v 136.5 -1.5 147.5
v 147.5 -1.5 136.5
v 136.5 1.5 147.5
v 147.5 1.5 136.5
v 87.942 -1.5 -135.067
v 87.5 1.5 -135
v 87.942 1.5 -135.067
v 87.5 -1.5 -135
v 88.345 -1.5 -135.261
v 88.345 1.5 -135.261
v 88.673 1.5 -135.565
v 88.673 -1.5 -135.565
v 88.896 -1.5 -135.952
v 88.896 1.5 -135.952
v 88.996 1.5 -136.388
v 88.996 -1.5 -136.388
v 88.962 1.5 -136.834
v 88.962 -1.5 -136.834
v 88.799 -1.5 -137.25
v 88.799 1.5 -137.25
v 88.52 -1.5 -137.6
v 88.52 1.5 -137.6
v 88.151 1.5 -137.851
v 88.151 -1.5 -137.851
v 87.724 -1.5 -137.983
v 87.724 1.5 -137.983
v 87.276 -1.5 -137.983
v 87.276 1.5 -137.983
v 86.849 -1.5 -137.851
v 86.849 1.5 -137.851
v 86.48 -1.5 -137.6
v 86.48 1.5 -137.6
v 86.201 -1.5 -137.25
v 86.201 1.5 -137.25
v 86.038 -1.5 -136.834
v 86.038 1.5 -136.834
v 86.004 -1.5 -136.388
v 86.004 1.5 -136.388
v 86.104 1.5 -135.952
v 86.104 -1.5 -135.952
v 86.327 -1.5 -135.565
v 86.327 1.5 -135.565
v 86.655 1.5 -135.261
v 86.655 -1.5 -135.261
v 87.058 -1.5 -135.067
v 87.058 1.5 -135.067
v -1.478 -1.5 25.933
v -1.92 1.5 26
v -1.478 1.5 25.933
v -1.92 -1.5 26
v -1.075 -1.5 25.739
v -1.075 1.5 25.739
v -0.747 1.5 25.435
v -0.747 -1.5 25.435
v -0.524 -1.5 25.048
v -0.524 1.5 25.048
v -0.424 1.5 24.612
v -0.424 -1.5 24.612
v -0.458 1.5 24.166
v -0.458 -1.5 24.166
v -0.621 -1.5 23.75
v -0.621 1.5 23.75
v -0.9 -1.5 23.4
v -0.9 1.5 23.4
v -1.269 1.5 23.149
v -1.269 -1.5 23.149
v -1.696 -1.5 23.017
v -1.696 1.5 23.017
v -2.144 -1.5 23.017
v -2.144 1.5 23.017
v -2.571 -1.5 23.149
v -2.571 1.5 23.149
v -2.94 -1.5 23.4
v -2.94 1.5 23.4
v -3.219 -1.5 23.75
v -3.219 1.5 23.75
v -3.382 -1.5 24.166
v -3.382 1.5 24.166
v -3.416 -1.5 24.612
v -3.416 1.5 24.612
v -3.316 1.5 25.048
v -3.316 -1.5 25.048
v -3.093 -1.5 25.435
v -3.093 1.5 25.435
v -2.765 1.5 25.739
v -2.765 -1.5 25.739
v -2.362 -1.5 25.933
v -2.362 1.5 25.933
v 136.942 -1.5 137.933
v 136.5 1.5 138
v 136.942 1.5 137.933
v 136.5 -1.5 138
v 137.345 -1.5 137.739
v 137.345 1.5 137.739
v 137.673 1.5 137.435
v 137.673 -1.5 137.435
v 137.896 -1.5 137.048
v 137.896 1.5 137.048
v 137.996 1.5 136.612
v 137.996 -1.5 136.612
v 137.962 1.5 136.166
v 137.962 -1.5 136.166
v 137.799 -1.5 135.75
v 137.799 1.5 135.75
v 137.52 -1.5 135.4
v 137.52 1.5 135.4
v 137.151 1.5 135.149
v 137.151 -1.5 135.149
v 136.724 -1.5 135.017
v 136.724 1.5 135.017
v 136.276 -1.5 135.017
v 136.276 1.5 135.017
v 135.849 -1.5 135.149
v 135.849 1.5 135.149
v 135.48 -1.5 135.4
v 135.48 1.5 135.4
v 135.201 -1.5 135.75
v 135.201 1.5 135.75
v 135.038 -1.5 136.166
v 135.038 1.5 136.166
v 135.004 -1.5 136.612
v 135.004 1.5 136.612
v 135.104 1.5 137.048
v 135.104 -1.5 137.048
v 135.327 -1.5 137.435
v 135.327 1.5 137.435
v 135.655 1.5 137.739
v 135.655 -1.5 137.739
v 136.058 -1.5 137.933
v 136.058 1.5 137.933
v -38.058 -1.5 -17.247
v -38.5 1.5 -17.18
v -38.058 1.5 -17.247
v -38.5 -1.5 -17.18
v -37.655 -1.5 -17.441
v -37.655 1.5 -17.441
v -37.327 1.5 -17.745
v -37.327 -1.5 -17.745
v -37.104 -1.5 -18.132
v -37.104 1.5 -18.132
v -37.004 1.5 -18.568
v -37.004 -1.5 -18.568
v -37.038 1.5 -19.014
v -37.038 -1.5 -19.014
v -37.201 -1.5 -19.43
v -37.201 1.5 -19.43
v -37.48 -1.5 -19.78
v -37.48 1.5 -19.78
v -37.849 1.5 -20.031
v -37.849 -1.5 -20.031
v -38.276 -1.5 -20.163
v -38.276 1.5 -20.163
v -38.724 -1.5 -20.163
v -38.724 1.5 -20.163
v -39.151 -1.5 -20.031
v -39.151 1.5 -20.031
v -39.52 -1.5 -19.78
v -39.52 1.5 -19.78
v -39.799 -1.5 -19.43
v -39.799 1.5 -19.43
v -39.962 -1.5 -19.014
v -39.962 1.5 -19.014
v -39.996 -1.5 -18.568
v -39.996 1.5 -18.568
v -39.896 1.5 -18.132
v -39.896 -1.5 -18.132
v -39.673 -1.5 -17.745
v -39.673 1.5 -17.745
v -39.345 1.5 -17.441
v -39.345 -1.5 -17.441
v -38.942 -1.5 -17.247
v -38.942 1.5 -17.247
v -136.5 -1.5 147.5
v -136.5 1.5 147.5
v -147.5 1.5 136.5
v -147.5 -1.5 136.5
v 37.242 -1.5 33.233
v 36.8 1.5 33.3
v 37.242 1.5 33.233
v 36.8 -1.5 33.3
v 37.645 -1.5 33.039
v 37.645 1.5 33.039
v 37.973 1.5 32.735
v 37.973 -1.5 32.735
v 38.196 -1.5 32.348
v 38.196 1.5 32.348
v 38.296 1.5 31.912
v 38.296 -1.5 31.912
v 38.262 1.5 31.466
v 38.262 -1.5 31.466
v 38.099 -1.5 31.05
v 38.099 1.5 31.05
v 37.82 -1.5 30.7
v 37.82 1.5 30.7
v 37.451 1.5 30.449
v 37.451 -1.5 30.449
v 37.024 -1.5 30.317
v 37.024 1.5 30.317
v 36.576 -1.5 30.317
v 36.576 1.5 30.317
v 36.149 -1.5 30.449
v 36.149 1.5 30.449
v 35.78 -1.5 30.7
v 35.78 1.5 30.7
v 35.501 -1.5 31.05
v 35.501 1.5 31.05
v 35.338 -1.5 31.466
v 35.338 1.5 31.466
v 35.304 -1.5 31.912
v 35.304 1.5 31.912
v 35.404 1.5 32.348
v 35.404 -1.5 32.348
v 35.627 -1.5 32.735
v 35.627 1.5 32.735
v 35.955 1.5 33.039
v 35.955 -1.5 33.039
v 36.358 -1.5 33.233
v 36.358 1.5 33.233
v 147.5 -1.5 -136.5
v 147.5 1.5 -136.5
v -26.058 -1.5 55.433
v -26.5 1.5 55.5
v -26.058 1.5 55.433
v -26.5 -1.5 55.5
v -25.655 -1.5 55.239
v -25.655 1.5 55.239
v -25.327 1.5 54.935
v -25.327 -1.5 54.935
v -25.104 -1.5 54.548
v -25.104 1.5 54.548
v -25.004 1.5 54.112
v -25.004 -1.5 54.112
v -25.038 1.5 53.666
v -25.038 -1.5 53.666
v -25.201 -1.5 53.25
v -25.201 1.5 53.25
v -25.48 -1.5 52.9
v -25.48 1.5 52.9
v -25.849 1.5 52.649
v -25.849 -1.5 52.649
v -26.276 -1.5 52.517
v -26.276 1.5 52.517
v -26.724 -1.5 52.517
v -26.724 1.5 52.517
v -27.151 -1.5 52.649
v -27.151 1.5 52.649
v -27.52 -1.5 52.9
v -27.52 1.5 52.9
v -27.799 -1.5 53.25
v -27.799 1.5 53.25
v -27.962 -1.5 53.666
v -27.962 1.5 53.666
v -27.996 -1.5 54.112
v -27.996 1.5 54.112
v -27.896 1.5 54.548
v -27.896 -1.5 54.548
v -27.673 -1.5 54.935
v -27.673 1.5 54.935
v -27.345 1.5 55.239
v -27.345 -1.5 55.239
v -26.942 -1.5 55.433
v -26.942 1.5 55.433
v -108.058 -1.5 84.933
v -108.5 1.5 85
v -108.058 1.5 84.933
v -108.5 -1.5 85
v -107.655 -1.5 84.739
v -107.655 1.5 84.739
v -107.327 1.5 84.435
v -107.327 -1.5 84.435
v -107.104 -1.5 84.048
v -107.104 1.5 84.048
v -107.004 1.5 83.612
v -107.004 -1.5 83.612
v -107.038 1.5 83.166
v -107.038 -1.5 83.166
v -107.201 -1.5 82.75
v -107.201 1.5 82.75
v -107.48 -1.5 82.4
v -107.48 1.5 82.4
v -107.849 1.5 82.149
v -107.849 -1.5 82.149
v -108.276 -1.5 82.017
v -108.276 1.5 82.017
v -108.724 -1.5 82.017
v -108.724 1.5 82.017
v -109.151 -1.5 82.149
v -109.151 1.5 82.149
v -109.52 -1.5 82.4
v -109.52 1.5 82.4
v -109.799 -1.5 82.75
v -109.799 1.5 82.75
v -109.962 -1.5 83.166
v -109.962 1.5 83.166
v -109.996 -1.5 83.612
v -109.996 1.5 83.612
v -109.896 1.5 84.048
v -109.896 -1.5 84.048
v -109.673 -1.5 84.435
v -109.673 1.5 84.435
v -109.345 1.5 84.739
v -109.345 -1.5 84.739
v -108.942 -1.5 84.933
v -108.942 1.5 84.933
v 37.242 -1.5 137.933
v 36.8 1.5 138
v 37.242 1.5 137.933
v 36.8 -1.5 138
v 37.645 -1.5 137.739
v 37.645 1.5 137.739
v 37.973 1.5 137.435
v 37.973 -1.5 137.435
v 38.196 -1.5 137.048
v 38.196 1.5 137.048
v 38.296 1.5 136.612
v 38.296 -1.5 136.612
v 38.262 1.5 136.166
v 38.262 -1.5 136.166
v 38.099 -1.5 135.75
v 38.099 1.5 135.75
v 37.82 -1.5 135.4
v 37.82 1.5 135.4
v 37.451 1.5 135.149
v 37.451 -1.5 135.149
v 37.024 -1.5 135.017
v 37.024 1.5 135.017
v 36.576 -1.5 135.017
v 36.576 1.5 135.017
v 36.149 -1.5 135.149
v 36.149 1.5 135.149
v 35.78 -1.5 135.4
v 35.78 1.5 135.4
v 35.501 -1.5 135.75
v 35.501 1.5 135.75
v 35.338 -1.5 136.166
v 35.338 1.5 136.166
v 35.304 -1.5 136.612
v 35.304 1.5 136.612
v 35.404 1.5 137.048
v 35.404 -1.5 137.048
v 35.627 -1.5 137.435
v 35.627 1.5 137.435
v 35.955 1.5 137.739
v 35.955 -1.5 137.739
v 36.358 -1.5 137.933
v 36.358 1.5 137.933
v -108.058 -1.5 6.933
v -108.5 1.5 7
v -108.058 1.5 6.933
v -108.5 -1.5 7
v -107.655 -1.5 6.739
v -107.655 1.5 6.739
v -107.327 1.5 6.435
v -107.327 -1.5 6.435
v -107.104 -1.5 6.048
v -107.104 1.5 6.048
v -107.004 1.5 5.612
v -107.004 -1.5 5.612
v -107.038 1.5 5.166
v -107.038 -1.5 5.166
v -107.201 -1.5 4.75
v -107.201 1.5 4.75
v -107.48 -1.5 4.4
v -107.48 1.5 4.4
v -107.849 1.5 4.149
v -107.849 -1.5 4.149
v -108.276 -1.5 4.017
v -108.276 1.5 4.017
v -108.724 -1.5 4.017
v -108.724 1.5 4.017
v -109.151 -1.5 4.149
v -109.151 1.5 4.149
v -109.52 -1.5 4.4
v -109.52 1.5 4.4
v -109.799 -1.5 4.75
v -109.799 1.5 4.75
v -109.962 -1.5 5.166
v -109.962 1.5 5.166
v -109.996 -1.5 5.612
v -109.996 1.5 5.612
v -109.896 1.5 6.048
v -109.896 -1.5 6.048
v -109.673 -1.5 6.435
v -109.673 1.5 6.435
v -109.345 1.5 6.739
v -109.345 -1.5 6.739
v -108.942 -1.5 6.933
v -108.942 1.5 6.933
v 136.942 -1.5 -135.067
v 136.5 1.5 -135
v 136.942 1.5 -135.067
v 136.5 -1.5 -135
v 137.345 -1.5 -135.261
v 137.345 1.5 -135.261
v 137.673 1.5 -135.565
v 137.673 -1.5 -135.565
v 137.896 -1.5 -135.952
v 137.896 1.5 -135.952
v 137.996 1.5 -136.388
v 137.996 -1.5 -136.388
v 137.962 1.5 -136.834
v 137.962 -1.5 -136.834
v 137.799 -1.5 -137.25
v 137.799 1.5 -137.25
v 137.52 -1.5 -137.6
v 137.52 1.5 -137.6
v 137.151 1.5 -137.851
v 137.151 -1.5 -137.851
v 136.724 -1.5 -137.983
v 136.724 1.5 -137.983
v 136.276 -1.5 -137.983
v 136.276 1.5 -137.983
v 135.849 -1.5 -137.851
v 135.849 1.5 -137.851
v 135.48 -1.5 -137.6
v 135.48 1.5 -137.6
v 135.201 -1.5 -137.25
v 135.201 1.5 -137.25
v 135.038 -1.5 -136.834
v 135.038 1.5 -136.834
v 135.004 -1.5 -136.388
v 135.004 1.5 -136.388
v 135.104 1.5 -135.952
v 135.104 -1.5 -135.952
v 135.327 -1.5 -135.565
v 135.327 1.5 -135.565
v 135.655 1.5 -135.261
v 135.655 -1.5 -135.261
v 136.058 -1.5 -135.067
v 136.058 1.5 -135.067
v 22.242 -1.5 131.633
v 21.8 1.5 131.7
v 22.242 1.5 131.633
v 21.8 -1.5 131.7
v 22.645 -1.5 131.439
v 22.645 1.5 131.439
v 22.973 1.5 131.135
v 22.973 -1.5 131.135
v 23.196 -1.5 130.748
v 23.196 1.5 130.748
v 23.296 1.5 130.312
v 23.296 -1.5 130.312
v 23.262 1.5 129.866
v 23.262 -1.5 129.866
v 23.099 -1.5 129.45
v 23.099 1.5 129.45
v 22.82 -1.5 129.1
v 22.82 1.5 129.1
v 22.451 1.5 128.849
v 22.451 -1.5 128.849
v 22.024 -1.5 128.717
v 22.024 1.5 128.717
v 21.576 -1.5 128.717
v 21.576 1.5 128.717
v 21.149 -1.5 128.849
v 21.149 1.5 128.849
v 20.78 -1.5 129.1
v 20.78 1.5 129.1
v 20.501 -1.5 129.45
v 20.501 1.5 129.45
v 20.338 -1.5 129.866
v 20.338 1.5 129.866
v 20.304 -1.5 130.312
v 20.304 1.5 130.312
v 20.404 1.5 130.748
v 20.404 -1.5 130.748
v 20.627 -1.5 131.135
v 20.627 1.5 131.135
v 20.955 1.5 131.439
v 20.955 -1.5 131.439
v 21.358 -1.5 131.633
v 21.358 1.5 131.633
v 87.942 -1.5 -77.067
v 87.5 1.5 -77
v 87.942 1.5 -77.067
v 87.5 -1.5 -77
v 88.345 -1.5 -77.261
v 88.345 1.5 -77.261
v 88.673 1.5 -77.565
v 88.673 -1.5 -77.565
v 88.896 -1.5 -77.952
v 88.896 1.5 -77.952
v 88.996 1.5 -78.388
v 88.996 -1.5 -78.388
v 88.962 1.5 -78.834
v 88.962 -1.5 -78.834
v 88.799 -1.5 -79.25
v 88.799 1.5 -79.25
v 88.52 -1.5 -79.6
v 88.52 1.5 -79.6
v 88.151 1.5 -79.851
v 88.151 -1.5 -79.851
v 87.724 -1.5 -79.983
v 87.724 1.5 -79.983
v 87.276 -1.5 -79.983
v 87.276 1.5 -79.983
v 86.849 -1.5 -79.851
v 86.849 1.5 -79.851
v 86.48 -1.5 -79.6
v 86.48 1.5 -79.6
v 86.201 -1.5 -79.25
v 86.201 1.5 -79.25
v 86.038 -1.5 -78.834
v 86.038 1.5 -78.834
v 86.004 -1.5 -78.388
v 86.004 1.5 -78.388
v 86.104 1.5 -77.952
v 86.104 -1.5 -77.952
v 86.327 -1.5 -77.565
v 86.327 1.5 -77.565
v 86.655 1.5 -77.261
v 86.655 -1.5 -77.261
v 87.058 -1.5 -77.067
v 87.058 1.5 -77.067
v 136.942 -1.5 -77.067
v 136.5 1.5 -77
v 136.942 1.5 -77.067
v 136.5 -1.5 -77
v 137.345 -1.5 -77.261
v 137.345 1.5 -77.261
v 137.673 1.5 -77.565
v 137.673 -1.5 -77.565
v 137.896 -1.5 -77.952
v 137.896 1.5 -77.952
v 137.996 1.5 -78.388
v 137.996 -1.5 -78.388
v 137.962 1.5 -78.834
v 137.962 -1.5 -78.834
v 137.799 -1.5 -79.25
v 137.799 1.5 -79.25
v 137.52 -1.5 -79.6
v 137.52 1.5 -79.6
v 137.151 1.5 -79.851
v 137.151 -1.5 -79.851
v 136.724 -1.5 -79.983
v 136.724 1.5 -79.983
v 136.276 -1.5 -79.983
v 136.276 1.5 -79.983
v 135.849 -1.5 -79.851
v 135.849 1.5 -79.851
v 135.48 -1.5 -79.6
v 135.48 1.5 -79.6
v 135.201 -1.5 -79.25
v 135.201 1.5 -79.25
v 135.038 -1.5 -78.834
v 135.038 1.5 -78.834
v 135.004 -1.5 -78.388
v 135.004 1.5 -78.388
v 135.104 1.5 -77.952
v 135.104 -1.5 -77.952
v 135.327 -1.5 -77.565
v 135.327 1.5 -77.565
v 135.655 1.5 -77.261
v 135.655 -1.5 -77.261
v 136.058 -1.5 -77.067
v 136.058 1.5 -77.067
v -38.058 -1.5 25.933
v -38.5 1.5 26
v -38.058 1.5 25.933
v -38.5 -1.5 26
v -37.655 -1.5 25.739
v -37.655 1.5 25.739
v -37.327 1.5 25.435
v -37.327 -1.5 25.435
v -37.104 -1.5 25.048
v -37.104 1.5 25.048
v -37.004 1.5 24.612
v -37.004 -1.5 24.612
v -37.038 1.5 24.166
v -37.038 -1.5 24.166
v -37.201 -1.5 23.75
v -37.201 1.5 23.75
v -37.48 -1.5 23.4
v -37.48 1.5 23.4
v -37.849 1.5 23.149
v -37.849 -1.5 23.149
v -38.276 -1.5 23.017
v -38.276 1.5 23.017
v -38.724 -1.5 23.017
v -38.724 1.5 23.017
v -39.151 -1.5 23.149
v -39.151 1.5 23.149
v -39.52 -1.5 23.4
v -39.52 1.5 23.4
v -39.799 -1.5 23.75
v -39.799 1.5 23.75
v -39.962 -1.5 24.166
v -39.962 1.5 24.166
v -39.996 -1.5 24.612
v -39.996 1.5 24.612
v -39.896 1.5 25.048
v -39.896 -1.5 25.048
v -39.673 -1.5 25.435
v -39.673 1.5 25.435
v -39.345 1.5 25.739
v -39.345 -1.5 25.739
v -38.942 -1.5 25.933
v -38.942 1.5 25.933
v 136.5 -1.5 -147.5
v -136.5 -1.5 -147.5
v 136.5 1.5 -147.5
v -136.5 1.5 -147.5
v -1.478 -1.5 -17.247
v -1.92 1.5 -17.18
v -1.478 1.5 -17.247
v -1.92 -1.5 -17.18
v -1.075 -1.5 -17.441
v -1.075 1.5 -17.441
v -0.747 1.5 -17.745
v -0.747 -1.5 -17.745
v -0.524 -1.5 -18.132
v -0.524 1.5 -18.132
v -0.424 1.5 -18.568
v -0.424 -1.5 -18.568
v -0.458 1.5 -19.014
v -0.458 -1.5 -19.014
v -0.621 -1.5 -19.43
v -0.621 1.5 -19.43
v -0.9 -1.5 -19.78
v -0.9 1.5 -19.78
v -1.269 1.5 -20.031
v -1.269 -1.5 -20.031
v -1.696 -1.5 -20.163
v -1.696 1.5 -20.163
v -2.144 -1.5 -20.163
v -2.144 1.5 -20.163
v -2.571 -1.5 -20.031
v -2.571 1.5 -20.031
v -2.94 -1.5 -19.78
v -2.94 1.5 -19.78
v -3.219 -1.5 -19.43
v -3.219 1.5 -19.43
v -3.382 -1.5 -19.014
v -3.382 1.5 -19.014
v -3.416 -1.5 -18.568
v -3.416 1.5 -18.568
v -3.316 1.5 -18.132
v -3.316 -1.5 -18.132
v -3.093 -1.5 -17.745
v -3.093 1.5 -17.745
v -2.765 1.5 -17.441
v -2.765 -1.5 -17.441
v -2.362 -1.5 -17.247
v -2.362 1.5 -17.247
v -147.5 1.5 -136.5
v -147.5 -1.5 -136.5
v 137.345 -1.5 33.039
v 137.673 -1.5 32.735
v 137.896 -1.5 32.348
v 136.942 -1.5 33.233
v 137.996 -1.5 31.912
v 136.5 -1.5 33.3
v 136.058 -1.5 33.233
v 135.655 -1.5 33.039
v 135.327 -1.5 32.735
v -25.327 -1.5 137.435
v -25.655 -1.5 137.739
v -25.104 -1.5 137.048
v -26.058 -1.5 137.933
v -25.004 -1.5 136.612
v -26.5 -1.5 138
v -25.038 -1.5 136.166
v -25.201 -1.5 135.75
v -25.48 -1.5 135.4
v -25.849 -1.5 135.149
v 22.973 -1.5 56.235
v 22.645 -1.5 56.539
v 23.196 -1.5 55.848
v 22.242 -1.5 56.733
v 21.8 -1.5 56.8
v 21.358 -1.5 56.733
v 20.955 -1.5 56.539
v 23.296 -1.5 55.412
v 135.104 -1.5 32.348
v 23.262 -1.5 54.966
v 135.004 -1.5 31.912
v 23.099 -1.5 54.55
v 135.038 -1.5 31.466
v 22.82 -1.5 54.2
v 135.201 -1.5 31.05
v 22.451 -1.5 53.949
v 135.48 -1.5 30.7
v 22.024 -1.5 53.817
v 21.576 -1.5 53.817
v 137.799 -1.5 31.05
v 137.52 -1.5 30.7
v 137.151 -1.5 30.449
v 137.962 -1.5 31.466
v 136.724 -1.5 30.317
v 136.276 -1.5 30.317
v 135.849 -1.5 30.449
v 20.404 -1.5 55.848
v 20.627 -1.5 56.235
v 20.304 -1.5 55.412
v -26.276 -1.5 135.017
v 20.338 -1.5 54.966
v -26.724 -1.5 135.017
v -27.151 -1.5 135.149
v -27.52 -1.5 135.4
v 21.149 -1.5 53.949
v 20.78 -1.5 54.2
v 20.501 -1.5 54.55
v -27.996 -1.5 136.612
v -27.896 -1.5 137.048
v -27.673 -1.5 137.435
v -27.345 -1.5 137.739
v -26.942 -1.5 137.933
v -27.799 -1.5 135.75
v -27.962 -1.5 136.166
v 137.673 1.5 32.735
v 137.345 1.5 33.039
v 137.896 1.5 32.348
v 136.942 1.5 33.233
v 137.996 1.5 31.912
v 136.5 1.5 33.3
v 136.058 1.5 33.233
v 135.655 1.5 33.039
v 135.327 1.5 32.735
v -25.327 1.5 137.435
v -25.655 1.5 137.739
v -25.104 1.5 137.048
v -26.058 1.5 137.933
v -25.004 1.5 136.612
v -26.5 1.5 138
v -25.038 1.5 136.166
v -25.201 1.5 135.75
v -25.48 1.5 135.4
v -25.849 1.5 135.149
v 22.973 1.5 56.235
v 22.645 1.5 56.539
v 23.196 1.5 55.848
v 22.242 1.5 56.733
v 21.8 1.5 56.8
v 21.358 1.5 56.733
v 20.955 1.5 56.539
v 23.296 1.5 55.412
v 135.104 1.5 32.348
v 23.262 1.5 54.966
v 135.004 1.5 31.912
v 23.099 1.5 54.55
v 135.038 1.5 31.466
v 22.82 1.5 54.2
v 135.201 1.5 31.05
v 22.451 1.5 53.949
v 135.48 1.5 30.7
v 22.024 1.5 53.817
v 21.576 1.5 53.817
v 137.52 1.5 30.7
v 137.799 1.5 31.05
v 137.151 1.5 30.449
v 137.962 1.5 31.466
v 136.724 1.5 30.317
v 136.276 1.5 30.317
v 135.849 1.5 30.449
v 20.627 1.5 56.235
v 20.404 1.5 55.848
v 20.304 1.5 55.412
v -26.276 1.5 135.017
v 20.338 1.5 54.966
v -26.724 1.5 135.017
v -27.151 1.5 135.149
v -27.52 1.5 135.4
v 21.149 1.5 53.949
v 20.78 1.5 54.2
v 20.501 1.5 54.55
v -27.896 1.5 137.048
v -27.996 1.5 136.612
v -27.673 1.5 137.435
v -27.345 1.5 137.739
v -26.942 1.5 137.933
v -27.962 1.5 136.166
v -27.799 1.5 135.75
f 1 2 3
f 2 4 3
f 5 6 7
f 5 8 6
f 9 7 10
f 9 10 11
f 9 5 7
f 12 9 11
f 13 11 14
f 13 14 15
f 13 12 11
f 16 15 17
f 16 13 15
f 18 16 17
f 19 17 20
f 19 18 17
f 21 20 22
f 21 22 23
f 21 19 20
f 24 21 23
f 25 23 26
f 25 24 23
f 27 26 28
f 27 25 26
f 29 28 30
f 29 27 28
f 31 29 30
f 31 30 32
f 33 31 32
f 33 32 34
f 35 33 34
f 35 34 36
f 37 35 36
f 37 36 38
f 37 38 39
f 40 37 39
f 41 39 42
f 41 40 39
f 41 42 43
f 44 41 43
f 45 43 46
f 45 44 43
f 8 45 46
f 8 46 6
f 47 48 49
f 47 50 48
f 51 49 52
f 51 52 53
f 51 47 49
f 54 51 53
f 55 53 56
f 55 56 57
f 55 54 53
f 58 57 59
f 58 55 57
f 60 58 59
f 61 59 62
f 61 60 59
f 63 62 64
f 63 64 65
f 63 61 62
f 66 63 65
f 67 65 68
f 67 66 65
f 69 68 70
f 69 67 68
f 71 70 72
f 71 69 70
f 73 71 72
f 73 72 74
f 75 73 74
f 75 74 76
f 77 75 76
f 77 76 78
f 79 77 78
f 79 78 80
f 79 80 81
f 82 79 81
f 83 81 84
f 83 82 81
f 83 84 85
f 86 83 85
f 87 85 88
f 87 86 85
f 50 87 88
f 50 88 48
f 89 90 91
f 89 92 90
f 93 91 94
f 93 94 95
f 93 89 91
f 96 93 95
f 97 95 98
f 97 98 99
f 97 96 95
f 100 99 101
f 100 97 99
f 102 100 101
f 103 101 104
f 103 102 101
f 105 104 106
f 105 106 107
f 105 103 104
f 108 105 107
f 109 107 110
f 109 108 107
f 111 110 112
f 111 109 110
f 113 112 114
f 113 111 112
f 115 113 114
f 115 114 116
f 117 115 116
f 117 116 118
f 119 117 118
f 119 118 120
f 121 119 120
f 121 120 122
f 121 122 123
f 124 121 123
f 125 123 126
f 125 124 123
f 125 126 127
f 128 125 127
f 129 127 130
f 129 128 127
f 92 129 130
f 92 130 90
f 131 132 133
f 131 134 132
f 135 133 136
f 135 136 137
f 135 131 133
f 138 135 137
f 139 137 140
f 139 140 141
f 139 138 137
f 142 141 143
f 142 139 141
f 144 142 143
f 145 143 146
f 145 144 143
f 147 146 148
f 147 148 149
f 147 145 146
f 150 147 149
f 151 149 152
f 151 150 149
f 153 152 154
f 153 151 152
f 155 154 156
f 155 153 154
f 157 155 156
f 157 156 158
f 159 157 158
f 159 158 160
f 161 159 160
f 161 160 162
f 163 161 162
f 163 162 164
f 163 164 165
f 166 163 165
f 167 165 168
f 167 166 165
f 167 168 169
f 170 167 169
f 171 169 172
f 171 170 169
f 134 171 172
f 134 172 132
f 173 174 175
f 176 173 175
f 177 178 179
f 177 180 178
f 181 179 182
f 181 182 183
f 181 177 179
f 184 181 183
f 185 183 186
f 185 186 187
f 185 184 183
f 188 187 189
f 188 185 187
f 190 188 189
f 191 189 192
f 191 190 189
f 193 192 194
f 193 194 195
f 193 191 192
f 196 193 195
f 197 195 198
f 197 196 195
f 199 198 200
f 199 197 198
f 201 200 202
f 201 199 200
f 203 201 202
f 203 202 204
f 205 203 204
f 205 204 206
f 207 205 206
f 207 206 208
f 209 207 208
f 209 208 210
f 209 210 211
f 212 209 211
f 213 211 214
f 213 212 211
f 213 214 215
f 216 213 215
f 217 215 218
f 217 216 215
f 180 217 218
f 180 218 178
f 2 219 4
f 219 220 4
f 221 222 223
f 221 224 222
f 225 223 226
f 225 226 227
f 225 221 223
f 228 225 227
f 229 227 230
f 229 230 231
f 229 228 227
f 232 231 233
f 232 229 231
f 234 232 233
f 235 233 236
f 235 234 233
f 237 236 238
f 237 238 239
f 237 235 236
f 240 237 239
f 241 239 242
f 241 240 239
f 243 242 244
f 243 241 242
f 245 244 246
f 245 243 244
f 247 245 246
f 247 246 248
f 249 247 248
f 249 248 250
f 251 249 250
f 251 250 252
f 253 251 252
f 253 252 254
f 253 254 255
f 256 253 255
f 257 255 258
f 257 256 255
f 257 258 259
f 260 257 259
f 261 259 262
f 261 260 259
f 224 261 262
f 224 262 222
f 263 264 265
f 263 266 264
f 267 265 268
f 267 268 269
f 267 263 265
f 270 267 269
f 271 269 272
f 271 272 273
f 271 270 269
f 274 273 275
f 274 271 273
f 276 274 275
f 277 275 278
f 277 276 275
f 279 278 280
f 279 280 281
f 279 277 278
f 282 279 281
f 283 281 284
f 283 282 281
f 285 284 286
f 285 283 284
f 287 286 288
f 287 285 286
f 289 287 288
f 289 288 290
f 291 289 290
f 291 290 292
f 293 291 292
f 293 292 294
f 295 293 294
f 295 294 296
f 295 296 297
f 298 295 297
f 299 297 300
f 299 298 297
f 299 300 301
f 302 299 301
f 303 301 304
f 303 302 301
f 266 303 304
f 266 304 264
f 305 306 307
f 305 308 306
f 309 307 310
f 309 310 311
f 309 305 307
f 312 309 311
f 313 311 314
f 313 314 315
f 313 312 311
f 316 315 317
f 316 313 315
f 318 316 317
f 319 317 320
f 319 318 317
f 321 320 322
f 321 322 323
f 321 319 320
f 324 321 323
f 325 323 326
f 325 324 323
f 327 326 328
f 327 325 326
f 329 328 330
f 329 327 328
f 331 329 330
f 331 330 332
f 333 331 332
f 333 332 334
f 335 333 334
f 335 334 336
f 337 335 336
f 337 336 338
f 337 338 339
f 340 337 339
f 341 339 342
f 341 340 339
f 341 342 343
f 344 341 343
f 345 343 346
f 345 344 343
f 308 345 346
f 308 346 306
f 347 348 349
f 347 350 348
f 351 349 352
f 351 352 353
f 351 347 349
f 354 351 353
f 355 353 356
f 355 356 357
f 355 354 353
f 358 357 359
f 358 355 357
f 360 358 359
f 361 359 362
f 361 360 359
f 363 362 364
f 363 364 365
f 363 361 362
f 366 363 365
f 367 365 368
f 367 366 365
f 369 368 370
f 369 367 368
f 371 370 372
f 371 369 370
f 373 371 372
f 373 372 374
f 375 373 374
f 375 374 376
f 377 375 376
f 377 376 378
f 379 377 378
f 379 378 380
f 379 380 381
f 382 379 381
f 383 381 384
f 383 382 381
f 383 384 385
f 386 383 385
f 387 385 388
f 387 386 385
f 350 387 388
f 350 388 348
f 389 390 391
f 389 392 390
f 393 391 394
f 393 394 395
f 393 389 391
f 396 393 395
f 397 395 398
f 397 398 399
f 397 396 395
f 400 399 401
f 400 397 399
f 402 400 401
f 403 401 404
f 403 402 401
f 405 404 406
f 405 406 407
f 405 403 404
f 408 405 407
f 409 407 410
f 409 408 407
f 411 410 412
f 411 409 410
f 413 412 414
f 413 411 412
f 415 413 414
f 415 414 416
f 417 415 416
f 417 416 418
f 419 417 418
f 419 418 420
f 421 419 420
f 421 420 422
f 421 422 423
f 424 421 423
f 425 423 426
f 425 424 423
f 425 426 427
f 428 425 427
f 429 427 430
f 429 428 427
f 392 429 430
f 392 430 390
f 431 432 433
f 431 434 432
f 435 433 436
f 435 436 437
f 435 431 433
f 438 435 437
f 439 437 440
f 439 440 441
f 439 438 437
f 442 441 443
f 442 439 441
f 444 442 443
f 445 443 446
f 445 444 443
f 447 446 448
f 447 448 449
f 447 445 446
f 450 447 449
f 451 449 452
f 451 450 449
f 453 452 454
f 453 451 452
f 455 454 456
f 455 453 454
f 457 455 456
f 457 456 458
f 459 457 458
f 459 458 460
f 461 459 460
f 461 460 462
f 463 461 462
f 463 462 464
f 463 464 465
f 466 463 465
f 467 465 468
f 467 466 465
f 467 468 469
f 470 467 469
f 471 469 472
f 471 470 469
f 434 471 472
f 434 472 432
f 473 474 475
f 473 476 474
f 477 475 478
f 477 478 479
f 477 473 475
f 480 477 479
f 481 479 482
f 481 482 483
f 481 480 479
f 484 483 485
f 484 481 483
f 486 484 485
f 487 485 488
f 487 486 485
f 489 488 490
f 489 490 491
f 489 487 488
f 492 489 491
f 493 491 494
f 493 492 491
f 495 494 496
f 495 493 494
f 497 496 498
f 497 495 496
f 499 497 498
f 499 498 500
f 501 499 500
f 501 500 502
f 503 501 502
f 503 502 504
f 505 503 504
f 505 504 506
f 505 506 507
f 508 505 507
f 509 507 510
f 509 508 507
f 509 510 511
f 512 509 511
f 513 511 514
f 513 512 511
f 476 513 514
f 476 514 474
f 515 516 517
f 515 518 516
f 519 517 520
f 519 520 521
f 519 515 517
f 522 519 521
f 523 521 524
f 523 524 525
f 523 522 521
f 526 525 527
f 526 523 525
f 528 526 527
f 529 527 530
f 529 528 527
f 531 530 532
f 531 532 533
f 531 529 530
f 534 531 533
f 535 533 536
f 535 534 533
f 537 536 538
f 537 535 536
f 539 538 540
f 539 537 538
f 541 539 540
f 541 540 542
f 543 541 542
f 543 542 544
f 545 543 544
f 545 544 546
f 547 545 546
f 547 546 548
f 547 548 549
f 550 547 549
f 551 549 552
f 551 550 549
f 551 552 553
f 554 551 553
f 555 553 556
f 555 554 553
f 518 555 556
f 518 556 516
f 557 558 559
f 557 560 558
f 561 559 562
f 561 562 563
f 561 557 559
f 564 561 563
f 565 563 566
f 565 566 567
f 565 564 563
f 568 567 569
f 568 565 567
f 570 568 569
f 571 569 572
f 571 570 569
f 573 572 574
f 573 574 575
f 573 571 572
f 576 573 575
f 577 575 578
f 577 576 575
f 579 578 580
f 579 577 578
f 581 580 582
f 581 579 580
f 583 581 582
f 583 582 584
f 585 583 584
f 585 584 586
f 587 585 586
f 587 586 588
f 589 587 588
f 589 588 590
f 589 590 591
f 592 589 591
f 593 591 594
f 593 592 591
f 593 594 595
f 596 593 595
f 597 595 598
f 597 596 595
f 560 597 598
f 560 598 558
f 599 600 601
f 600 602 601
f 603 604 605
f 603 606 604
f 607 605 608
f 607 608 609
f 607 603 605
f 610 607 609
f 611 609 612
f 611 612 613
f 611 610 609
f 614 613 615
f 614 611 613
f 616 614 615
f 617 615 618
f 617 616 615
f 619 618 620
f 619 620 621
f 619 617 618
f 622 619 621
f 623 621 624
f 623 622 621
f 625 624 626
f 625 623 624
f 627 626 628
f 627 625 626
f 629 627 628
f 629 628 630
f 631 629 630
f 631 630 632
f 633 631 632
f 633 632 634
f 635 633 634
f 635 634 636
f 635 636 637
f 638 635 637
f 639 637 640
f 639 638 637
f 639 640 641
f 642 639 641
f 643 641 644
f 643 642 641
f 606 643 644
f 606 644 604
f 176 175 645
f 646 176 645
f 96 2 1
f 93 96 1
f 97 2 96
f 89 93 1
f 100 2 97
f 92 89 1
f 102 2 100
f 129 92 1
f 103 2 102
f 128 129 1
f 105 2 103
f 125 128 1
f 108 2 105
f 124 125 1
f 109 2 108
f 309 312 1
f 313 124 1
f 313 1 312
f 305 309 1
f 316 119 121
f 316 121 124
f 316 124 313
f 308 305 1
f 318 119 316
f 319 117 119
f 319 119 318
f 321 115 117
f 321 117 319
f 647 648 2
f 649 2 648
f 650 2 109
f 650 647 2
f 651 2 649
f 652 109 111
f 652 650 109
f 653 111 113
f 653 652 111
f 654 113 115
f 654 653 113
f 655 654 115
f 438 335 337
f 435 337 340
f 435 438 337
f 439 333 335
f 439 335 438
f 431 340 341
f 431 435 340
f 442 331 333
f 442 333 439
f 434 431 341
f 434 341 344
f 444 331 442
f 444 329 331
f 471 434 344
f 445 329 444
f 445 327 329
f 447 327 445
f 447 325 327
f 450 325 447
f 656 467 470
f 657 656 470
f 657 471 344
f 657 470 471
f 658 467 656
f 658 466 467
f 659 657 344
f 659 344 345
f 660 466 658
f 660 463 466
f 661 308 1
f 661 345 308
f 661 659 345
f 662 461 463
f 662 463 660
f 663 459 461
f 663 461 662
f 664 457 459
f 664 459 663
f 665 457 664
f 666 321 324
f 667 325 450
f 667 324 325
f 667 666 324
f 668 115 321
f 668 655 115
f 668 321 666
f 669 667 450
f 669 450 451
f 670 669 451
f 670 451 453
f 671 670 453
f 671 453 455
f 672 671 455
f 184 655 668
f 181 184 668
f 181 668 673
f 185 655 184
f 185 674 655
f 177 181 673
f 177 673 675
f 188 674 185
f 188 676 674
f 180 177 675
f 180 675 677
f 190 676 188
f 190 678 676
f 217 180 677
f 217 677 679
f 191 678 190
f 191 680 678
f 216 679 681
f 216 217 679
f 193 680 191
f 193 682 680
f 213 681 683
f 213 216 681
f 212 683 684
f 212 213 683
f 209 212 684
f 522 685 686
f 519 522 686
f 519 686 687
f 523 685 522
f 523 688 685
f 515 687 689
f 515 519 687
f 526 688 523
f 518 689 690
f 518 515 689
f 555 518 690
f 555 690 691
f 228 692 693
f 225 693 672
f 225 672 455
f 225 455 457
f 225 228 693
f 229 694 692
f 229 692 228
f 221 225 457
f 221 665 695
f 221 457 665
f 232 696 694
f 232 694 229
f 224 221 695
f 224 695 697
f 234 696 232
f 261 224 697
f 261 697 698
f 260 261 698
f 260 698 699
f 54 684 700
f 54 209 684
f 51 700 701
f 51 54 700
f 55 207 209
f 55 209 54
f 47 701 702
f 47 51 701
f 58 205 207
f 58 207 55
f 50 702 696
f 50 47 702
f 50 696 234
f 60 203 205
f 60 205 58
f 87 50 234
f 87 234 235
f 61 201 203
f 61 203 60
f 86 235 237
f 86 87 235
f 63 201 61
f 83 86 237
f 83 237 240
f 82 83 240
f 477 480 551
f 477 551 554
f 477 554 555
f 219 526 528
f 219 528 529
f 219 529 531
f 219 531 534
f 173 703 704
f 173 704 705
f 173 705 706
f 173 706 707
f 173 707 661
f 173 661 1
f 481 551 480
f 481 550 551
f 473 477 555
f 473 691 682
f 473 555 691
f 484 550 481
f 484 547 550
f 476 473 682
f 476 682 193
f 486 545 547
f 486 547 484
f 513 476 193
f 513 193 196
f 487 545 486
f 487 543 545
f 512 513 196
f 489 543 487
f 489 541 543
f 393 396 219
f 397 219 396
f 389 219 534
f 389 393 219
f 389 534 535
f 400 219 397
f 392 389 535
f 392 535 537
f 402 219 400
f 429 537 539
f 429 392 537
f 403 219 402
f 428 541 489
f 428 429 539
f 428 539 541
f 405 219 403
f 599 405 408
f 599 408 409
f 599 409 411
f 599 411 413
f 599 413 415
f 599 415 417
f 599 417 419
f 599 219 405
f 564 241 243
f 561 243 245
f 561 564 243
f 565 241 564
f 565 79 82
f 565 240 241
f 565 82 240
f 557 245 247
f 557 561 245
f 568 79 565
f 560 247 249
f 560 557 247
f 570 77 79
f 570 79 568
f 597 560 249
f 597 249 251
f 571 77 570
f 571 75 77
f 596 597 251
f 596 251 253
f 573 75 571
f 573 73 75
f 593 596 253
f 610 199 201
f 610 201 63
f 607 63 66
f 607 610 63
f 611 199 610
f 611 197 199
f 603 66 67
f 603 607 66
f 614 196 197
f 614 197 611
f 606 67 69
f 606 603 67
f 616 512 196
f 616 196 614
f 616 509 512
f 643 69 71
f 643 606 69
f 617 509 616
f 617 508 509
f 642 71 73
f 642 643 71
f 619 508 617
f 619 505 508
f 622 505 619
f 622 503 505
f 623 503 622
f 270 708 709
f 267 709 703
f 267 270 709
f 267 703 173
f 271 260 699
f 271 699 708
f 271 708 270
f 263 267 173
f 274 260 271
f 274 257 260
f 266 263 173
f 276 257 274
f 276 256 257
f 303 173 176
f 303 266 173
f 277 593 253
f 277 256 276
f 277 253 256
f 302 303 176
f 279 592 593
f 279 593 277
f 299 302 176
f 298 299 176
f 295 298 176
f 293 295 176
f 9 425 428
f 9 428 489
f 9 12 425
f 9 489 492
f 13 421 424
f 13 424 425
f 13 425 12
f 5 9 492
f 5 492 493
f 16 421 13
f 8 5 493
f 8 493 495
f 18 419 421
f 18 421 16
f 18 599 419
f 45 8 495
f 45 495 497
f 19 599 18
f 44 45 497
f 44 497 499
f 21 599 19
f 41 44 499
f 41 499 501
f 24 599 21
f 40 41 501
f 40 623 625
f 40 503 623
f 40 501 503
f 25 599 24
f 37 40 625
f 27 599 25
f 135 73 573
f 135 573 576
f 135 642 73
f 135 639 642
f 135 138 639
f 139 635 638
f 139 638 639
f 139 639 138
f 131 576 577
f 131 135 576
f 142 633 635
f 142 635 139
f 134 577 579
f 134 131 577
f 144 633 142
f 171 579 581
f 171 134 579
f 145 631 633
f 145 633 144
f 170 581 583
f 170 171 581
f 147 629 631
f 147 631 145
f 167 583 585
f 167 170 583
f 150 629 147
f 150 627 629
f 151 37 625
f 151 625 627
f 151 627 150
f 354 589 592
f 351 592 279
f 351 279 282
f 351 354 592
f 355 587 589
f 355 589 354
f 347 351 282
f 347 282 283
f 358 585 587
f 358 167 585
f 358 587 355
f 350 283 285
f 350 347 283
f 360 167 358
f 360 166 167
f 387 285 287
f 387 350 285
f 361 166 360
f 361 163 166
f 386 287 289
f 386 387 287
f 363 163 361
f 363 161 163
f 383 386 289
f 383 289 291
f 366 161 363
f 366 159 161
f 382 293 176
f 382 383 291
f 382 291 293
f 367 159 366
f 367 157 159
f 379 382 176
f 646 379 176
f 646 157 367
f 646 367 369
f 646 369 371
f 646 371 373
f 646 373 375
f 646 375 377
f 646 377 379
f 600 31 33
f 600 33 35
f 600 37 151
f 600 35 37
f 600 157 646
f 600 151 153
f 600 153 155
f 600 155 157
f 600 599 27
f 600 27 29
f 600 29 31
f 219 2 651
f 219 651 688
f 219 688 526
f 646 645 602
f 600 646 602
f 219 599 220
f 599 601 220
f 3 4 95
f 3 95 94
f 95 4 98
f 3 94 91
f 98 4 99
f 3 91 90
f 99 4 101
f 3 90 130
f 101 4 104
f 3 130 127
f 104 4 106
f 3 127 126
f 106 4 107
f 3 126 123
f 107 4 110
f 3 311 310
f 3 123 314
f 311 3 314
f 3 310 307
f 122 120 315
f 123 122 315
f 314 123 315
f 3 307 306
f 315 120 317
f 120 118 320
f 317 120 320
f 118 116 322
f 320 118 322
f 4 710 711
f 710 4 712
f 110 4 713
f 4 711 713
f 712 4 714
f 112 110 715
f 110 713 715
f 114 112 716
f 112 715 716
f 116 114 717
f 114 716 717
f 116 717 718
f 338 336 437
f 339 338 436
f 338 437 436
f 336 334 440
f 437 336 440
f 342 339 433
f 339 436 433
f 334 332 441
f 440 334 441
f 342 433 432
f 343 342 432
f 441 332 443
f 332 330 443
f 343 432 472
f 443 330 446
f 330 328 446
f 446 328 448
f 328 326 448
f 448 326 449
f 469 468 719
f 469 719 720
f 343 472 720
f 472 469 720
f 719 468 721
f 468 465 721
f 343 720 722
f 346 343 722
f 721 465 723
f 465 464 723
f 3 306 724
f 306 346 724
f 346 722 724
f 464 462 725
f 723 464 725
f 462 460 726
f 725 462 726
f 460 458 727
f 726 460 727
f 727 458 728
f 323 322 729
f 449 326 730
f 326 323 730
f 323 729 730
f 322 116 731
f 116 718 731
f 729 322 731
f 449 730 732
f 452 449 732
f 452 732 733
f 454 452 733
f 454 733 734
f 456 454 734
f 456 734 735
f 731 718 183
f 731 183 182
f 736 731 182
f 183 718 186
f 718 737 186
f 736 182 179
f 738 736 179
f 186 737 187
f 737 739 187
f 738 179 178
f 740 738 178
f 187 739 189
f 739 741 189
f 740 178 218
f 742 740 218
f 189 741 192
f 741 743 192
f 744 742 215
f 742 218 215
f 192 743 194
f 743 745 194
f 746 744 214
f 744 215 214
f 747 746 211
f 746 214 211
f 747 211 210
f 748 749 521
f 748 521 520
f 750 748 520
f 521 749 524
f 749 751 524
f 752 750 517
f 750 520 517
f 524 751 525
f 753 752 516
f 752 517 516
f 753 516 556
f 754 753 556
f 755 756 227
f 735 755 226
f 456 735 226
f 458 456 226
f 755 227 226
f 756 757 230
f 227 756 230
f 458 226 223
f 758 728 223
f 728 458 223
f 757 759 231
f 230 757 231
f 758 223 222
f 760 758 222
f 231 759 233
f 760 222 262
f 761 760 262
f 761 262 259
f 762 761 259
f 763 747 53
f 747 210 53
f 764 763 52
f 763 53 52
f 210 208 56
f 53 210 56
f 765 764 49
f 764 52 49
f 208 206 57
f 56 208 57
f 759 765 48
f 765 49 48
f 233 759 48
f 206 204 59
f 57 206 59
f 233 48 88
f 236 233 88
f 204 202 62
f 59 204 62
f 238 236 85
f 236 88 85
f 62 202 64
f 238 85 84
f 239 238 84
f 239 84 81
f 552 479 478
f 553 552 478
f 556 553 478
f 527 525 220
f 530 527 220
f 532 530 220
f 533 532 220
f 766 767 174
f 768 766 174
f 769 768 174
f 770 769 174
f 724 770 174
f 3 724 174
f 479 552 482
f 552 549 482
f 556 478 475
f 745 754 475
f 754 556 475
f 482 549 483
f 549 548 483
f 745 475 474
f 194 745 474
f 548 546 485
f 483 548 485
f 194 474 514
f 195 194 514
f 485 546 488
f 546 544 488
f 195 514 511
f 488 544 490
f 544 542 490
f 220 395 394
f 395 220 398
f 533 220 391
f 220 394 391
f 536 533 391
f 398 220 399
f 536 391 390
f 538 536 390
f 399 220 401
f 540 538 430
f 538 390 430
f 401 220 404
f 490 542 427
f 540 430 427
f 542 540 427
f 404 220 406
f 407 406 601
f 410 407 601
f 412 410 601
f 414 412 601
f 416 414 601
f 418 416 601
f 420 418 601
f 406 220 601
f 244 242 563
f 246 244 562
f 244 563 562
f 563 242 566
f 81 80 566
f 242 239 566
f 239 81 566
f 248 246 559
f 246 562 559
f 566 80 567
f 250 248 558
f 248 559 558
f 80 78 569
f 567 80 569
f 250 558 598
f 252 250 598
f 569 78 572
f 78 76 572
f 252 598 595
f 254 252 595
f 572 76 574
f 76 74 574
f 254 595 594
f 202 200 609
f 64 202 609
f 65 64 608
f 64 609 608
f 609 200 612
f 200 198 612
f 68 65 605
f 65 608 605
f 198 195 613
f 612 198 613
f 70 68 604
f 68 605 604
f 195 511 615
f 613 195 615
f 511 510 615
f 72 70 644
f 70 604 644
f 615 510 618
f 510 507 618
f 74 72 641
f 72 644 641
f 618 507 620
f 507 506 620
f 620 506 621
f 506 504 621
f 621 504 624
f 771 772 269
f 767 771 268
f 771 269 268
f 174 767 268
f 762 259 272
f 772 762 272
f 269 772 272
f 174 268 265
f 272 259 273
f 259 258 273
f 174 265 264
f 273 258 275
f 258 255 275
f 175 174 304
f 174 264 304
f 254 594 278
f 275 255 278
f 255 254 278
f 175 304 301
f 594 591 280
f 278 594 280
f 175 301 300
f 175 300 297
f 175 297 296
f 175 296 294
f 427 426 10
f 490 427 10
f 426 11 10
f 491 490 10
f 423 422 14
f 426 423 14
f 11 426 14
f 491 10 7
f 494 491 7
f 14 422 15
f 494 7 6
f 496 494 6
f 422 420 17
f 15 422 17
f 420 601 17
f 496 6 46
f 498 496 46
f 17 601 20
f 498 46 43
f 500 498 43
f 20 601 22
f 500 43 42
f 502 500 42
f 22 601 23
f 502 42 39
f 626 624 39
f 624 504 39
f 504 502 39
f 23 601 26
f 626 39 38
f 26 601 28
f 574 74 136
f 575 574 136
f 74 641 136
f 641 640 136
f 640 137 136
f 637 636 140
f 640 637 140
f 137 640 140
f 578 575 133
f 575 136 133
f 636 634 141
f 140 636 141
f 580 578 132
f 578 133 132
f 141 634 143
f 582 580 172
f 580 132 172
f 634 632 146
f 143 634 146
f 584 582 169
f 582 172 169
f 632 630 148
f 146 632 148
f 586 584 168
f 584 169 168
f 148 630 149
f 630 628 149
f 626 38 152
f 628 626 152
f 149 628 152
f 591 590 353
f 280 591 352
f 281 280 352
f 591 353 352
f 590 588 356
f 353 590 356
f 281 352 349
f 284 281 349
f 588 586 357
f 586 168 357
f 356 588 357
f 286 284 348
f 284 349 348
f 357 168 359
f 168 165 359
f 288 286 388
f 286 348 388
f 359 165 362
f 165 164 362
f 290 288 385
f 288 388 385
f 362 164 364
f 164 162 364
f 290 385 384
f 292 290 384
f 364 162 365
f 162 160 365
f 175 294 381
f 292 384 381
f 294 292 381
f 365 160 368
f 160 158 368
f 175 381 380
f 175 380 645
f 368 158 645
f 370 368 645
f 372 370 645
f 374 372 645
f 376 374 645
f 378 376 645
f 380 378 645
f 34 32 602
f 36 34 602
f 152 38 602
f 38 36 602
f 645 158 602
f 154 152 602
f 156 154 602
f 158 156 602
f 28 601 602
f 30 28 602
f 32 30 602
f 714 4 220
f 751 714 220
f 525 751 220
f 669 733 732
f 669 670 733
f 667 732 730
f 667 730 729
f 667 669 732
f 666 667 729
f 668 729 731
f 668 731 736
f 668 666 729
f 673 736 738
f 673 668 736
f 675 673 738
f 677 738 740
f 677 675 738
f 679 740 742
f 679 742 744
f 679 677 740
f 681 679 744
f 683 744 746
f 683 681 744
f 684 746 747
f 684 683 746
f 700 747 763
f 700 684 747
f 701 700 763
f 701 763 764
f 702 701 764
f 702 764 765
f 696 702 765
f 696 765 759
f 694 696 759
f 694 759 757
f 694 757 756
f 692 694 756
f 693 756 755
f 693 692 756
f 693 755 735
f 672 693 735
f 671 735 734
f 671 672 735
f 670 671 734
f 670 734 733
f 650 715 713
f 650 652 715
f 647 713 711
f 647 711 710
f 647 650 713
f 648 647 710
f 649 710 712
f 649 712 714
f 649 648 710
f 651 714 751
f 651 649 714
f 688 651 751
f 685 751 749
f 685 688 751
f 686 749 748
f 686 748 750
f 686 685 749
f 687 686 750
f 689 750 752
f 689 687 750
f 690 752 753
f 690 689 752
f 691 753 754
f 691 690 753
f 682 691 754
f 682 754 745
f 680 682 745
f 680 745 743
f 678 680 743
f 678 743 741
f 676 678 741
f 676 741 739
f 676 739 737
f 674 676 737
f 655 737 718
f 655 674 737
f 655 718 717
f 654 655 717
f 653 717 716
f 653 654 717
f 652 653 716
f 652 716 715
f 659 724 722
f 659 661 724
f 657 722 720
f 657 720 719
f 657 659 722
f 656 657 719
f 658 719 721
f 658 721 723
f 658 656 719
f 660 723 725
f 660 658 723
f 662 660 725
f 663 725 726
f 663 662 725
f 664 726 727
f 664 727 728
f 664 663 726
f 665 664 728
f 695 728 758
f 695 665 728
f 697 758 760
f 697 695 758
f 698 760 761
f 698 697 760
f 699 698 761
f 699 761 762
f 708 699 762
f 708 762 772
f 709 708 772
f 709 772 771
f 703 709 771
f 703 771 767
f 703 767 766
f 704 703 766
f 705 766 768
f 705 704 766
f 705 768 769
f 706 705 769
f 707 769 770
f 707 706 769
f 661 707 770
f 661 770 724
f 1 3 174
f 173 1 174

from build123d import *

# Parameters (mm, degrees)
SKETCH1_R           = 1.5
BOSS_EXTRUDE1_DEPTH = 1.5


with BuildPart() as part:
    # Sketch1 → Boss-Extrude1 (new, symmetric)
    with BuildSketch(Plane(origin=(0, 0, 0), x_dir=(1, 0, 0), z_dir=(0, 1, 0))):
        Polygon((-147.5, 136.5), (-136.5, 147.5), (136.5, 147.5), (147.5, 136.5), (147.5, -136.5), (136.5, -147.5), (-136.5, -147.5), (-147.5, -136.5), align=None)
        with Locations(Location((-26.5, -136.5, 0), (0, 0, 270))):
            Circle(SKETCH1_R, mode=Mode.SUBTRACT)
        with Locations(Location((-26.5, -54, 0), (0, 0, 270))):
            Circle(SKETCH1_R, mode=Mode.SUBTRACT)
        with Locations(Location((21.8, -55.3, 0), (0, 0, 270))):
            Circle(SKETCH1_R, mode=Mode.SUBTRACT)
        with Locations(Location((21.8, -130.2, 0), (0, 0, 270))):
            Circle(SKETCH1_R, mode=Mode.SUBTRACT)
        with Locations(Location((-108.5, -83.5, 0), (0, 0, 270))):
            Circle(SKETCH1_R, mode=Mode.SUBTRACT)
        with Locations(Location((-108.5, -5.5, 0), (0, 0, 270))):
            Circle(SKETCH1_R, mode=Mode.SUBTRACT)
        with Locations(Location((-38.5, -24.5, 0), (0, 0, 270))):
            Circle(SKETCH1_R, mode=Mode.SUBTRACT)
        with Locations(Location((-1.92, 18.68, 0), (0, 0, 270))):
            Circle(SKETCH1_R, mode=Mode.SUBTRACT)
        with Locations(Location((-38.5, 18.68, 0), (0, 0, 270))):
            Circle(SKETCH1_R, mode=Mode.SUBTRACT)
        with Locations(Location((-1.92, -24.5, 0), (0, 0, 270))):
            Circle(SKETCH1_R, mode=Mode.SUBTRACT)
        with Locations(Location((136.5, 136.5, 0), (0, 0, 270))):
            Circle(SKETCH1_R, mode=Mode.SUBTRACT)
        with Locations(Location((87.5, 136.5, 0), (0, 0, 270))):
            Circle(SKETCH1_R, mode=Mode.SUBTRACT)
        with Locations(Location((87.5, 78.5, 0), (0, 0, 270))):
            Circle(SKETCH1_R, mode=Mode.SUBTRACT)
        with Locations(Location((136.5, 78.5, 0), (0, 0, 270))):
            Circle(SKETCH1_R, mode=Mode.SUBTRACT)
        with Locations(Location((136.5, -136.5, 0), (0, 0, 270))):
            Circle(SKETCH1_R, mode=Mode.SUBTRACT)
        with Locations(Location((36.8, -136.5, 0), (0, 0, 270))):
            Circle(SKETCH1_R, mode=Mode.SUBTRACT)
        with Locations(Location((36.8, -31.8, 0), (0, 0, 270))):
            Circle(SKETCH1_R, mode=Mode.SUBTRACT)
        with Locations(Location((136.5, -31.8, 0), (0, 0, 270))):
            Circle(SKETCH1_R, mode=Mode.SUBTRACT)
    extrude(amount=BOSS_EXTRUDE1_DEPTH, both=True)


solid = part.part
